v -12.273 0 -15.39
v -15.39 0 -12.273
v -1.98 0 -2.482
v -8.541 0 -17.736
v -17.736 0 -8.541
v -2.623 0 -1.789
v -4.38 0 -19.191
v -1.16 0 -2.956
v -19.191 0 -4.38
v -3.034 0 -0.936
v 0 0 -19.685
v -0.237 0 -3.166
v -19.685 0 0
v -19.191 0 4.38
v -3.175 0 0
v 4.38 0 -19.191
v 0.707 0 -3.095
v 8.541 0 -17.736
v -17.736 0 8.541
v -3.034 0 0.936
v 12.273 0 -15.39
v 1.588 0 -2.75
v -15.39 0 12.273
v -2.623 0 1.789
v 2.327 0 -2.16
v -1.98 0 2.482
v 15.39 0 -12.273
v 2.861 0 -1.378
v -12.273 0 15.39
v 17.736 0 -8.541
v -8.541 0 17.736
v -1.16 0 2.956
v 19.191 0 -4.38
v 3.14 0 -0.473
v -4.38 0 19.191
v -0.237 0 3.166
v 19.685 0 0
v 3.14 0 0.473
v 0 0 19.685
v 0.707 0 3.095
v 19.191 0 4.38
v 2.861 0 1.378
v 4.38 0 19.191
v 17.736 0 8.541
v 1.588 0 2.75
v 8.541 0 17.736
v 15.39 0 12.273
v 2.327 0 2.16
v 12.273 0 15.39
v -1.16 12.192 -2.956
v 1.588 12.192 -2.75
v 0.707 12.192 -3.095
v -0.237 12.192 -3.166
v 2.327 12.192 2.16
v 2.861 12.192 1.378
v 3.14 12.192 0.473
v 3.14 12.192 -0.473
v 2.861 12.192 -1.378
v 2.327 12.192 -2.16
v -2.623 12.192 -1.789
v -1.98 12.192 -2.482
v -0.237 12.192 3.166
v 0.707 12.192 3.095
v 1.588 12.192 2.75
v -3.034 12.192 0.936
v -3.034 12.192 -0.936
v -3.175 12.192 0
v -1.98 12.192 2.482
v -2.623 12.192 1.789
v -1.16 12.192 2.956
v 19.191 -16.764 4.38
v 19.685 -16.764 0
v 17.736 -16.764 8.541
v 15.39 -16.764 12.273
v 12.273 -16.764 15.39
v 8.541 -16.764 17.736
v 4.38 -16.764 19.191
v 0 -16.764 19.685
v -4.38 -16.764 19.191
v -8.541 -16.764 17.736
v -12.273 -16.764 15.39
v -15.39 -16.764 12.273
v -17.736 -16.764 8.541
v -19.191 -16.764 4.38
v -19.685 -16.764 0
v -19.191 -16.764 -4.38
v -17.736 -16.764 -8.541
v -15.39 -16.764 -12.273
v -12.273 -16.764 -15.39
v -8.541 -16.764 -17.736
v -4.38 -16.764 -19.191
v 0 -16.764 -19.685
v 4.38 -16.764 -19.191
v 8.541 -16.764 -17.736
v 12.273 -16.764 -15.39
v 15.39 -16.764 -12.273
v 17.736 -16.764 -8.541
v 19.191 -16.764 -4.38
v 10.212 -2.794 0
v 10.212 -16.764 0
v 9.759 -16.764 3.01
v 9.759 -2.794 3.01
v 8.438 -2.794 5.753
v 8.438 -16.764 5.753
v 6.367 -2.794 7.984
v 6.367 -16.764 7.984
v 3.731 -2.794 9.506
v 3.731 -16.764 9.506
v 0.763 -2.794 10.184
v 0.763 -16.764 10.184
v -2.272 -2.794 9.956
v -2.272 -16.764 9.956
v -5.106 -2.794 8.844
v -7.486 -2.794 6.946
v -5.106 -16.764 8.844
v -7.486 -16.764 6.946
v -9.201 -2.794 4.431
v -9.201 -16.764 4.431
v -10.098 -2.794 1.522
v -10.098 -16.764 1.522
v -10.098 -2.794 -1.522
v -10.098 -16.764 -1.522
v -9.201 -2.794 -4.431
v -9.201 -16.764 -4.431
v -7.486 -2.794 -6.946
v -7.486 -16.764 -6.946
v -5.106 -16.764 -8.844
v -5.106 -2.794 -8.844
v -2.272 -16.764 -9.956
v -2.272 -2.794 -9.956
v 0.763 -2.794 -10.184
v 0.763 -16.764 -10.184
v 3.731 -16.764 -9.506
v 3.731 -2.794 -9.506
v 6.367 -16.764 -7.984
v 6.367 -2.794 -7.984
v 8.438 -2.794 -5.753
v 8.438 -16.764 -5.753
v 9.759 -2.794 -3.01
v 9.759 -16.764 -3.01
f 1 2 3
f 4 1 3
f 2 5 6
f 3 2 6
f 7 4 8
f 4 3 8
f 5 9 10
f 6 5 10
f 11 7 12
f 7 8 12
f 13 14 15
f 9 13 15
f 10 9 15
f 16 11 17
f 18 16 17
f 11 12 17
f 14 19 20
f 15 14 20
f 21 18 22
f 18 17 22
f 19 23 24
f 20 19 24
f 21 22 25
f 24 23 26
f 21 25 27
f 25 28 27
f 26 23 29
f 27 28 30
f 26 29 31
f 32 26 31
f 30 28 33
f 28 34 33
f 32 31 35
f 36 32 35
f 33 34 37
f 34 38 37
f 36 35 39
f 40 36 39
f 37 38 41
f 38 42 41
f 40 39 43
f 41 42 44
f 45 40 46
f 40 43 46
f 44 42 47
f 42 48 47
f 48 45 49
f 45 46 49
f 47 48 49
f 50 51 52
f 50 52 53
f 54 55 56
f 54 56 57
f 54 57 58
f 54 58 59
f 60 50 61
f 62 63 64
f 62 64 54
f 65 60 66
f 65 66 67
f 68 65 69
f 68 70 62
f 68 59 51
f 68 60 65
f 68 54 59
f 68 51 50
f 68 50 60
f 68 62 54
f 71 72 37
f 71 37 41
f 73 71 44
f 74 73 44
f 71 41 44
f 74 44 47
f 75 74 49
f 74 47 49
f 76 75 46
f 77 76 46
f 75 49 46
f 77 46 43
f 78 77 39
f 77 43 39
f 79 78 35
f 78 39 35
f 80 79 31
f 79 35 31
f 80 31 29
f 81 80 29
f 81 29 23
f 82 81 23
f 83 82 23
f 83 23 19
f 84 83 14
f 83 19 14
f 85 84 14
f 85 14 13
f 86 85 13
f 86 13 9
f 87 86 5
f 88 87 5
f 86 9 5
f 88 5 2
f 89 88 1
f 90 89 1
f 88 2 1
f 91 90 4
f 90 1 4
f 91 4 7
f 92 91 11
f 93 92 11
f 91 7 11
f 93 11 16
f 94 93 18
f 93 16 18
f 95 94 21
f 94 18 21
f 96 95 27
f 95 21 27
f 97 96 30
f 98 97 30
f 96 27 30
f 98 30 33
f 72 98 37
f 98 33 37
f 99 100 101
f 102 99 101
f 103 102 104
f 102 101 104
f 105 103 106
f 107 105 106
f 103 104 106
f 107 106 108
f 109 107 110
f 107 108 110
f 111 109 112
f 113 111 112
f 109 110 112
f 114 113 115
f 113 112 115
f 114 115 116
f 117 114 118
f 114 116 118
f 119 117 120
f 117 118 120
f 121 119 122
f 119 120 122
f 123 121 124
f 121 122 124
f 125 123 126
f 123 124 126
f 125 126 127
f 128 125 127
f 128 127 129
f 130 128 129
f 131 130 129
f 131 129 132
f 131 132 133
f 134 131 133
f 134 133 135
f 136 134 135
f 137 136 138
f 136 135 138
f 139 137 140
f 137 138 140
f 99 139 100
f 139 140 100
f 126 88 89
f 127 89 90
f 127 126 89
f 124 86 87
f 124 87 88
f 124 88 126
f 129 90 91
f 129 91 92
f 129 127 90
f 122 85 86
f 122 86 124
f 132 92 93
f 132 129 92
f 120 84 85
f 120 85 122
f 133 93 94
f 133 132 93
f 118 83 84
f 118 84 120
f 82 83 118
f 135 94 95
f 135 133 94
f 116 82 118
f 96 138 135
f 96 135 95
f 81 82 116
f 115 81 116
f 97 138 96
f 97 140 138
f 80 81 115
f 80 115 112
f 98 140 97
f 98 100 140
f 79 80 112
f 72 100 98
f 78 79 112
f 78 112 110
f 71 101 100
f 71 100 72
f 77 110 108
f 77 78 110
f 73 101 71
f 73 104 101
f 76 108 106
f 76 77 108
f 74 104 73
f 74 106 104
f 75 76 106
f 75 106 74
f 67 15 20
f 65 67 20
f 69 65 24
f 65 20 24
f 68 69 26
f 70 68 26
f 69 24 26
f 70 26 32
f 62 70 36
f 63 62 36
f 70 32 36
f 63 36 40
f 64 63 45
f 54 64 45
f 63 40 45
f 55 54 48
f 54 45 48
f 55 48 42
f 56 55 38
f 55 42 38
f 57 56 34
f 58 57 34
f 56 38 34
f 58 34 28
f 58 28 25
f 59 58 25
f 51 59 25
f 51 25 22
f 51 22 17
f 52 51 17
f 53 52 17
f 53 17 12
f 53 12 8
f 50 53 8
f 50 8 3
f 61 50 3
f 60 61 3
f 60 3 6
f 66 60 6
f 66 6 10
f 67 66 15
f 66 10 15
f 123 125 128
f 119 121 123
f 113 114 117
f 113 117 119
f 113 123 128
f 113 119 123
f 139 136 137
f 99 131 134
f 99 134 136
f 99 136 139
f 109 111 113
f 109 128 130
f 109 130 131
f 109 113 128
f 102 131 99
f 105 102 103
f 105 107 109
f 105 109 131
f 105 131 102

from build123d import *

# Parameters (mm, degrees)
F0_R     = 19.685
F1_DEPTH = 16.764
F2_R     = 10.212252
F3_DEPTH = 13.97
F4_R     = 3.175
F5_DEPTH = 12.192


with BuildPart() as f1:
    # F0 (on Front) → F1 (new body)
    with BuildSketch(Plane.XZ):
        Circle(F0_R)
    extrude(amount=F1_DEPTH)

    # F2 (on face) → F3 (cut)
    with BuildSketch(Plane.XZ.offset(16.764)):
        Circle(F2_R)
    extrude(amount=-F3_DEPTH, mode=Mode.SUBTRACT)

    # F4 (on face) → F5 (join)
    with BuildSketch(Plane(origin=(0, 0, 0), x_dir=(-1, 0, 0), z_dir=(0, 1, 0))):
        Circle(F4_R)
    extrude(amount=F5_DEPTH)


solid = f1.part
